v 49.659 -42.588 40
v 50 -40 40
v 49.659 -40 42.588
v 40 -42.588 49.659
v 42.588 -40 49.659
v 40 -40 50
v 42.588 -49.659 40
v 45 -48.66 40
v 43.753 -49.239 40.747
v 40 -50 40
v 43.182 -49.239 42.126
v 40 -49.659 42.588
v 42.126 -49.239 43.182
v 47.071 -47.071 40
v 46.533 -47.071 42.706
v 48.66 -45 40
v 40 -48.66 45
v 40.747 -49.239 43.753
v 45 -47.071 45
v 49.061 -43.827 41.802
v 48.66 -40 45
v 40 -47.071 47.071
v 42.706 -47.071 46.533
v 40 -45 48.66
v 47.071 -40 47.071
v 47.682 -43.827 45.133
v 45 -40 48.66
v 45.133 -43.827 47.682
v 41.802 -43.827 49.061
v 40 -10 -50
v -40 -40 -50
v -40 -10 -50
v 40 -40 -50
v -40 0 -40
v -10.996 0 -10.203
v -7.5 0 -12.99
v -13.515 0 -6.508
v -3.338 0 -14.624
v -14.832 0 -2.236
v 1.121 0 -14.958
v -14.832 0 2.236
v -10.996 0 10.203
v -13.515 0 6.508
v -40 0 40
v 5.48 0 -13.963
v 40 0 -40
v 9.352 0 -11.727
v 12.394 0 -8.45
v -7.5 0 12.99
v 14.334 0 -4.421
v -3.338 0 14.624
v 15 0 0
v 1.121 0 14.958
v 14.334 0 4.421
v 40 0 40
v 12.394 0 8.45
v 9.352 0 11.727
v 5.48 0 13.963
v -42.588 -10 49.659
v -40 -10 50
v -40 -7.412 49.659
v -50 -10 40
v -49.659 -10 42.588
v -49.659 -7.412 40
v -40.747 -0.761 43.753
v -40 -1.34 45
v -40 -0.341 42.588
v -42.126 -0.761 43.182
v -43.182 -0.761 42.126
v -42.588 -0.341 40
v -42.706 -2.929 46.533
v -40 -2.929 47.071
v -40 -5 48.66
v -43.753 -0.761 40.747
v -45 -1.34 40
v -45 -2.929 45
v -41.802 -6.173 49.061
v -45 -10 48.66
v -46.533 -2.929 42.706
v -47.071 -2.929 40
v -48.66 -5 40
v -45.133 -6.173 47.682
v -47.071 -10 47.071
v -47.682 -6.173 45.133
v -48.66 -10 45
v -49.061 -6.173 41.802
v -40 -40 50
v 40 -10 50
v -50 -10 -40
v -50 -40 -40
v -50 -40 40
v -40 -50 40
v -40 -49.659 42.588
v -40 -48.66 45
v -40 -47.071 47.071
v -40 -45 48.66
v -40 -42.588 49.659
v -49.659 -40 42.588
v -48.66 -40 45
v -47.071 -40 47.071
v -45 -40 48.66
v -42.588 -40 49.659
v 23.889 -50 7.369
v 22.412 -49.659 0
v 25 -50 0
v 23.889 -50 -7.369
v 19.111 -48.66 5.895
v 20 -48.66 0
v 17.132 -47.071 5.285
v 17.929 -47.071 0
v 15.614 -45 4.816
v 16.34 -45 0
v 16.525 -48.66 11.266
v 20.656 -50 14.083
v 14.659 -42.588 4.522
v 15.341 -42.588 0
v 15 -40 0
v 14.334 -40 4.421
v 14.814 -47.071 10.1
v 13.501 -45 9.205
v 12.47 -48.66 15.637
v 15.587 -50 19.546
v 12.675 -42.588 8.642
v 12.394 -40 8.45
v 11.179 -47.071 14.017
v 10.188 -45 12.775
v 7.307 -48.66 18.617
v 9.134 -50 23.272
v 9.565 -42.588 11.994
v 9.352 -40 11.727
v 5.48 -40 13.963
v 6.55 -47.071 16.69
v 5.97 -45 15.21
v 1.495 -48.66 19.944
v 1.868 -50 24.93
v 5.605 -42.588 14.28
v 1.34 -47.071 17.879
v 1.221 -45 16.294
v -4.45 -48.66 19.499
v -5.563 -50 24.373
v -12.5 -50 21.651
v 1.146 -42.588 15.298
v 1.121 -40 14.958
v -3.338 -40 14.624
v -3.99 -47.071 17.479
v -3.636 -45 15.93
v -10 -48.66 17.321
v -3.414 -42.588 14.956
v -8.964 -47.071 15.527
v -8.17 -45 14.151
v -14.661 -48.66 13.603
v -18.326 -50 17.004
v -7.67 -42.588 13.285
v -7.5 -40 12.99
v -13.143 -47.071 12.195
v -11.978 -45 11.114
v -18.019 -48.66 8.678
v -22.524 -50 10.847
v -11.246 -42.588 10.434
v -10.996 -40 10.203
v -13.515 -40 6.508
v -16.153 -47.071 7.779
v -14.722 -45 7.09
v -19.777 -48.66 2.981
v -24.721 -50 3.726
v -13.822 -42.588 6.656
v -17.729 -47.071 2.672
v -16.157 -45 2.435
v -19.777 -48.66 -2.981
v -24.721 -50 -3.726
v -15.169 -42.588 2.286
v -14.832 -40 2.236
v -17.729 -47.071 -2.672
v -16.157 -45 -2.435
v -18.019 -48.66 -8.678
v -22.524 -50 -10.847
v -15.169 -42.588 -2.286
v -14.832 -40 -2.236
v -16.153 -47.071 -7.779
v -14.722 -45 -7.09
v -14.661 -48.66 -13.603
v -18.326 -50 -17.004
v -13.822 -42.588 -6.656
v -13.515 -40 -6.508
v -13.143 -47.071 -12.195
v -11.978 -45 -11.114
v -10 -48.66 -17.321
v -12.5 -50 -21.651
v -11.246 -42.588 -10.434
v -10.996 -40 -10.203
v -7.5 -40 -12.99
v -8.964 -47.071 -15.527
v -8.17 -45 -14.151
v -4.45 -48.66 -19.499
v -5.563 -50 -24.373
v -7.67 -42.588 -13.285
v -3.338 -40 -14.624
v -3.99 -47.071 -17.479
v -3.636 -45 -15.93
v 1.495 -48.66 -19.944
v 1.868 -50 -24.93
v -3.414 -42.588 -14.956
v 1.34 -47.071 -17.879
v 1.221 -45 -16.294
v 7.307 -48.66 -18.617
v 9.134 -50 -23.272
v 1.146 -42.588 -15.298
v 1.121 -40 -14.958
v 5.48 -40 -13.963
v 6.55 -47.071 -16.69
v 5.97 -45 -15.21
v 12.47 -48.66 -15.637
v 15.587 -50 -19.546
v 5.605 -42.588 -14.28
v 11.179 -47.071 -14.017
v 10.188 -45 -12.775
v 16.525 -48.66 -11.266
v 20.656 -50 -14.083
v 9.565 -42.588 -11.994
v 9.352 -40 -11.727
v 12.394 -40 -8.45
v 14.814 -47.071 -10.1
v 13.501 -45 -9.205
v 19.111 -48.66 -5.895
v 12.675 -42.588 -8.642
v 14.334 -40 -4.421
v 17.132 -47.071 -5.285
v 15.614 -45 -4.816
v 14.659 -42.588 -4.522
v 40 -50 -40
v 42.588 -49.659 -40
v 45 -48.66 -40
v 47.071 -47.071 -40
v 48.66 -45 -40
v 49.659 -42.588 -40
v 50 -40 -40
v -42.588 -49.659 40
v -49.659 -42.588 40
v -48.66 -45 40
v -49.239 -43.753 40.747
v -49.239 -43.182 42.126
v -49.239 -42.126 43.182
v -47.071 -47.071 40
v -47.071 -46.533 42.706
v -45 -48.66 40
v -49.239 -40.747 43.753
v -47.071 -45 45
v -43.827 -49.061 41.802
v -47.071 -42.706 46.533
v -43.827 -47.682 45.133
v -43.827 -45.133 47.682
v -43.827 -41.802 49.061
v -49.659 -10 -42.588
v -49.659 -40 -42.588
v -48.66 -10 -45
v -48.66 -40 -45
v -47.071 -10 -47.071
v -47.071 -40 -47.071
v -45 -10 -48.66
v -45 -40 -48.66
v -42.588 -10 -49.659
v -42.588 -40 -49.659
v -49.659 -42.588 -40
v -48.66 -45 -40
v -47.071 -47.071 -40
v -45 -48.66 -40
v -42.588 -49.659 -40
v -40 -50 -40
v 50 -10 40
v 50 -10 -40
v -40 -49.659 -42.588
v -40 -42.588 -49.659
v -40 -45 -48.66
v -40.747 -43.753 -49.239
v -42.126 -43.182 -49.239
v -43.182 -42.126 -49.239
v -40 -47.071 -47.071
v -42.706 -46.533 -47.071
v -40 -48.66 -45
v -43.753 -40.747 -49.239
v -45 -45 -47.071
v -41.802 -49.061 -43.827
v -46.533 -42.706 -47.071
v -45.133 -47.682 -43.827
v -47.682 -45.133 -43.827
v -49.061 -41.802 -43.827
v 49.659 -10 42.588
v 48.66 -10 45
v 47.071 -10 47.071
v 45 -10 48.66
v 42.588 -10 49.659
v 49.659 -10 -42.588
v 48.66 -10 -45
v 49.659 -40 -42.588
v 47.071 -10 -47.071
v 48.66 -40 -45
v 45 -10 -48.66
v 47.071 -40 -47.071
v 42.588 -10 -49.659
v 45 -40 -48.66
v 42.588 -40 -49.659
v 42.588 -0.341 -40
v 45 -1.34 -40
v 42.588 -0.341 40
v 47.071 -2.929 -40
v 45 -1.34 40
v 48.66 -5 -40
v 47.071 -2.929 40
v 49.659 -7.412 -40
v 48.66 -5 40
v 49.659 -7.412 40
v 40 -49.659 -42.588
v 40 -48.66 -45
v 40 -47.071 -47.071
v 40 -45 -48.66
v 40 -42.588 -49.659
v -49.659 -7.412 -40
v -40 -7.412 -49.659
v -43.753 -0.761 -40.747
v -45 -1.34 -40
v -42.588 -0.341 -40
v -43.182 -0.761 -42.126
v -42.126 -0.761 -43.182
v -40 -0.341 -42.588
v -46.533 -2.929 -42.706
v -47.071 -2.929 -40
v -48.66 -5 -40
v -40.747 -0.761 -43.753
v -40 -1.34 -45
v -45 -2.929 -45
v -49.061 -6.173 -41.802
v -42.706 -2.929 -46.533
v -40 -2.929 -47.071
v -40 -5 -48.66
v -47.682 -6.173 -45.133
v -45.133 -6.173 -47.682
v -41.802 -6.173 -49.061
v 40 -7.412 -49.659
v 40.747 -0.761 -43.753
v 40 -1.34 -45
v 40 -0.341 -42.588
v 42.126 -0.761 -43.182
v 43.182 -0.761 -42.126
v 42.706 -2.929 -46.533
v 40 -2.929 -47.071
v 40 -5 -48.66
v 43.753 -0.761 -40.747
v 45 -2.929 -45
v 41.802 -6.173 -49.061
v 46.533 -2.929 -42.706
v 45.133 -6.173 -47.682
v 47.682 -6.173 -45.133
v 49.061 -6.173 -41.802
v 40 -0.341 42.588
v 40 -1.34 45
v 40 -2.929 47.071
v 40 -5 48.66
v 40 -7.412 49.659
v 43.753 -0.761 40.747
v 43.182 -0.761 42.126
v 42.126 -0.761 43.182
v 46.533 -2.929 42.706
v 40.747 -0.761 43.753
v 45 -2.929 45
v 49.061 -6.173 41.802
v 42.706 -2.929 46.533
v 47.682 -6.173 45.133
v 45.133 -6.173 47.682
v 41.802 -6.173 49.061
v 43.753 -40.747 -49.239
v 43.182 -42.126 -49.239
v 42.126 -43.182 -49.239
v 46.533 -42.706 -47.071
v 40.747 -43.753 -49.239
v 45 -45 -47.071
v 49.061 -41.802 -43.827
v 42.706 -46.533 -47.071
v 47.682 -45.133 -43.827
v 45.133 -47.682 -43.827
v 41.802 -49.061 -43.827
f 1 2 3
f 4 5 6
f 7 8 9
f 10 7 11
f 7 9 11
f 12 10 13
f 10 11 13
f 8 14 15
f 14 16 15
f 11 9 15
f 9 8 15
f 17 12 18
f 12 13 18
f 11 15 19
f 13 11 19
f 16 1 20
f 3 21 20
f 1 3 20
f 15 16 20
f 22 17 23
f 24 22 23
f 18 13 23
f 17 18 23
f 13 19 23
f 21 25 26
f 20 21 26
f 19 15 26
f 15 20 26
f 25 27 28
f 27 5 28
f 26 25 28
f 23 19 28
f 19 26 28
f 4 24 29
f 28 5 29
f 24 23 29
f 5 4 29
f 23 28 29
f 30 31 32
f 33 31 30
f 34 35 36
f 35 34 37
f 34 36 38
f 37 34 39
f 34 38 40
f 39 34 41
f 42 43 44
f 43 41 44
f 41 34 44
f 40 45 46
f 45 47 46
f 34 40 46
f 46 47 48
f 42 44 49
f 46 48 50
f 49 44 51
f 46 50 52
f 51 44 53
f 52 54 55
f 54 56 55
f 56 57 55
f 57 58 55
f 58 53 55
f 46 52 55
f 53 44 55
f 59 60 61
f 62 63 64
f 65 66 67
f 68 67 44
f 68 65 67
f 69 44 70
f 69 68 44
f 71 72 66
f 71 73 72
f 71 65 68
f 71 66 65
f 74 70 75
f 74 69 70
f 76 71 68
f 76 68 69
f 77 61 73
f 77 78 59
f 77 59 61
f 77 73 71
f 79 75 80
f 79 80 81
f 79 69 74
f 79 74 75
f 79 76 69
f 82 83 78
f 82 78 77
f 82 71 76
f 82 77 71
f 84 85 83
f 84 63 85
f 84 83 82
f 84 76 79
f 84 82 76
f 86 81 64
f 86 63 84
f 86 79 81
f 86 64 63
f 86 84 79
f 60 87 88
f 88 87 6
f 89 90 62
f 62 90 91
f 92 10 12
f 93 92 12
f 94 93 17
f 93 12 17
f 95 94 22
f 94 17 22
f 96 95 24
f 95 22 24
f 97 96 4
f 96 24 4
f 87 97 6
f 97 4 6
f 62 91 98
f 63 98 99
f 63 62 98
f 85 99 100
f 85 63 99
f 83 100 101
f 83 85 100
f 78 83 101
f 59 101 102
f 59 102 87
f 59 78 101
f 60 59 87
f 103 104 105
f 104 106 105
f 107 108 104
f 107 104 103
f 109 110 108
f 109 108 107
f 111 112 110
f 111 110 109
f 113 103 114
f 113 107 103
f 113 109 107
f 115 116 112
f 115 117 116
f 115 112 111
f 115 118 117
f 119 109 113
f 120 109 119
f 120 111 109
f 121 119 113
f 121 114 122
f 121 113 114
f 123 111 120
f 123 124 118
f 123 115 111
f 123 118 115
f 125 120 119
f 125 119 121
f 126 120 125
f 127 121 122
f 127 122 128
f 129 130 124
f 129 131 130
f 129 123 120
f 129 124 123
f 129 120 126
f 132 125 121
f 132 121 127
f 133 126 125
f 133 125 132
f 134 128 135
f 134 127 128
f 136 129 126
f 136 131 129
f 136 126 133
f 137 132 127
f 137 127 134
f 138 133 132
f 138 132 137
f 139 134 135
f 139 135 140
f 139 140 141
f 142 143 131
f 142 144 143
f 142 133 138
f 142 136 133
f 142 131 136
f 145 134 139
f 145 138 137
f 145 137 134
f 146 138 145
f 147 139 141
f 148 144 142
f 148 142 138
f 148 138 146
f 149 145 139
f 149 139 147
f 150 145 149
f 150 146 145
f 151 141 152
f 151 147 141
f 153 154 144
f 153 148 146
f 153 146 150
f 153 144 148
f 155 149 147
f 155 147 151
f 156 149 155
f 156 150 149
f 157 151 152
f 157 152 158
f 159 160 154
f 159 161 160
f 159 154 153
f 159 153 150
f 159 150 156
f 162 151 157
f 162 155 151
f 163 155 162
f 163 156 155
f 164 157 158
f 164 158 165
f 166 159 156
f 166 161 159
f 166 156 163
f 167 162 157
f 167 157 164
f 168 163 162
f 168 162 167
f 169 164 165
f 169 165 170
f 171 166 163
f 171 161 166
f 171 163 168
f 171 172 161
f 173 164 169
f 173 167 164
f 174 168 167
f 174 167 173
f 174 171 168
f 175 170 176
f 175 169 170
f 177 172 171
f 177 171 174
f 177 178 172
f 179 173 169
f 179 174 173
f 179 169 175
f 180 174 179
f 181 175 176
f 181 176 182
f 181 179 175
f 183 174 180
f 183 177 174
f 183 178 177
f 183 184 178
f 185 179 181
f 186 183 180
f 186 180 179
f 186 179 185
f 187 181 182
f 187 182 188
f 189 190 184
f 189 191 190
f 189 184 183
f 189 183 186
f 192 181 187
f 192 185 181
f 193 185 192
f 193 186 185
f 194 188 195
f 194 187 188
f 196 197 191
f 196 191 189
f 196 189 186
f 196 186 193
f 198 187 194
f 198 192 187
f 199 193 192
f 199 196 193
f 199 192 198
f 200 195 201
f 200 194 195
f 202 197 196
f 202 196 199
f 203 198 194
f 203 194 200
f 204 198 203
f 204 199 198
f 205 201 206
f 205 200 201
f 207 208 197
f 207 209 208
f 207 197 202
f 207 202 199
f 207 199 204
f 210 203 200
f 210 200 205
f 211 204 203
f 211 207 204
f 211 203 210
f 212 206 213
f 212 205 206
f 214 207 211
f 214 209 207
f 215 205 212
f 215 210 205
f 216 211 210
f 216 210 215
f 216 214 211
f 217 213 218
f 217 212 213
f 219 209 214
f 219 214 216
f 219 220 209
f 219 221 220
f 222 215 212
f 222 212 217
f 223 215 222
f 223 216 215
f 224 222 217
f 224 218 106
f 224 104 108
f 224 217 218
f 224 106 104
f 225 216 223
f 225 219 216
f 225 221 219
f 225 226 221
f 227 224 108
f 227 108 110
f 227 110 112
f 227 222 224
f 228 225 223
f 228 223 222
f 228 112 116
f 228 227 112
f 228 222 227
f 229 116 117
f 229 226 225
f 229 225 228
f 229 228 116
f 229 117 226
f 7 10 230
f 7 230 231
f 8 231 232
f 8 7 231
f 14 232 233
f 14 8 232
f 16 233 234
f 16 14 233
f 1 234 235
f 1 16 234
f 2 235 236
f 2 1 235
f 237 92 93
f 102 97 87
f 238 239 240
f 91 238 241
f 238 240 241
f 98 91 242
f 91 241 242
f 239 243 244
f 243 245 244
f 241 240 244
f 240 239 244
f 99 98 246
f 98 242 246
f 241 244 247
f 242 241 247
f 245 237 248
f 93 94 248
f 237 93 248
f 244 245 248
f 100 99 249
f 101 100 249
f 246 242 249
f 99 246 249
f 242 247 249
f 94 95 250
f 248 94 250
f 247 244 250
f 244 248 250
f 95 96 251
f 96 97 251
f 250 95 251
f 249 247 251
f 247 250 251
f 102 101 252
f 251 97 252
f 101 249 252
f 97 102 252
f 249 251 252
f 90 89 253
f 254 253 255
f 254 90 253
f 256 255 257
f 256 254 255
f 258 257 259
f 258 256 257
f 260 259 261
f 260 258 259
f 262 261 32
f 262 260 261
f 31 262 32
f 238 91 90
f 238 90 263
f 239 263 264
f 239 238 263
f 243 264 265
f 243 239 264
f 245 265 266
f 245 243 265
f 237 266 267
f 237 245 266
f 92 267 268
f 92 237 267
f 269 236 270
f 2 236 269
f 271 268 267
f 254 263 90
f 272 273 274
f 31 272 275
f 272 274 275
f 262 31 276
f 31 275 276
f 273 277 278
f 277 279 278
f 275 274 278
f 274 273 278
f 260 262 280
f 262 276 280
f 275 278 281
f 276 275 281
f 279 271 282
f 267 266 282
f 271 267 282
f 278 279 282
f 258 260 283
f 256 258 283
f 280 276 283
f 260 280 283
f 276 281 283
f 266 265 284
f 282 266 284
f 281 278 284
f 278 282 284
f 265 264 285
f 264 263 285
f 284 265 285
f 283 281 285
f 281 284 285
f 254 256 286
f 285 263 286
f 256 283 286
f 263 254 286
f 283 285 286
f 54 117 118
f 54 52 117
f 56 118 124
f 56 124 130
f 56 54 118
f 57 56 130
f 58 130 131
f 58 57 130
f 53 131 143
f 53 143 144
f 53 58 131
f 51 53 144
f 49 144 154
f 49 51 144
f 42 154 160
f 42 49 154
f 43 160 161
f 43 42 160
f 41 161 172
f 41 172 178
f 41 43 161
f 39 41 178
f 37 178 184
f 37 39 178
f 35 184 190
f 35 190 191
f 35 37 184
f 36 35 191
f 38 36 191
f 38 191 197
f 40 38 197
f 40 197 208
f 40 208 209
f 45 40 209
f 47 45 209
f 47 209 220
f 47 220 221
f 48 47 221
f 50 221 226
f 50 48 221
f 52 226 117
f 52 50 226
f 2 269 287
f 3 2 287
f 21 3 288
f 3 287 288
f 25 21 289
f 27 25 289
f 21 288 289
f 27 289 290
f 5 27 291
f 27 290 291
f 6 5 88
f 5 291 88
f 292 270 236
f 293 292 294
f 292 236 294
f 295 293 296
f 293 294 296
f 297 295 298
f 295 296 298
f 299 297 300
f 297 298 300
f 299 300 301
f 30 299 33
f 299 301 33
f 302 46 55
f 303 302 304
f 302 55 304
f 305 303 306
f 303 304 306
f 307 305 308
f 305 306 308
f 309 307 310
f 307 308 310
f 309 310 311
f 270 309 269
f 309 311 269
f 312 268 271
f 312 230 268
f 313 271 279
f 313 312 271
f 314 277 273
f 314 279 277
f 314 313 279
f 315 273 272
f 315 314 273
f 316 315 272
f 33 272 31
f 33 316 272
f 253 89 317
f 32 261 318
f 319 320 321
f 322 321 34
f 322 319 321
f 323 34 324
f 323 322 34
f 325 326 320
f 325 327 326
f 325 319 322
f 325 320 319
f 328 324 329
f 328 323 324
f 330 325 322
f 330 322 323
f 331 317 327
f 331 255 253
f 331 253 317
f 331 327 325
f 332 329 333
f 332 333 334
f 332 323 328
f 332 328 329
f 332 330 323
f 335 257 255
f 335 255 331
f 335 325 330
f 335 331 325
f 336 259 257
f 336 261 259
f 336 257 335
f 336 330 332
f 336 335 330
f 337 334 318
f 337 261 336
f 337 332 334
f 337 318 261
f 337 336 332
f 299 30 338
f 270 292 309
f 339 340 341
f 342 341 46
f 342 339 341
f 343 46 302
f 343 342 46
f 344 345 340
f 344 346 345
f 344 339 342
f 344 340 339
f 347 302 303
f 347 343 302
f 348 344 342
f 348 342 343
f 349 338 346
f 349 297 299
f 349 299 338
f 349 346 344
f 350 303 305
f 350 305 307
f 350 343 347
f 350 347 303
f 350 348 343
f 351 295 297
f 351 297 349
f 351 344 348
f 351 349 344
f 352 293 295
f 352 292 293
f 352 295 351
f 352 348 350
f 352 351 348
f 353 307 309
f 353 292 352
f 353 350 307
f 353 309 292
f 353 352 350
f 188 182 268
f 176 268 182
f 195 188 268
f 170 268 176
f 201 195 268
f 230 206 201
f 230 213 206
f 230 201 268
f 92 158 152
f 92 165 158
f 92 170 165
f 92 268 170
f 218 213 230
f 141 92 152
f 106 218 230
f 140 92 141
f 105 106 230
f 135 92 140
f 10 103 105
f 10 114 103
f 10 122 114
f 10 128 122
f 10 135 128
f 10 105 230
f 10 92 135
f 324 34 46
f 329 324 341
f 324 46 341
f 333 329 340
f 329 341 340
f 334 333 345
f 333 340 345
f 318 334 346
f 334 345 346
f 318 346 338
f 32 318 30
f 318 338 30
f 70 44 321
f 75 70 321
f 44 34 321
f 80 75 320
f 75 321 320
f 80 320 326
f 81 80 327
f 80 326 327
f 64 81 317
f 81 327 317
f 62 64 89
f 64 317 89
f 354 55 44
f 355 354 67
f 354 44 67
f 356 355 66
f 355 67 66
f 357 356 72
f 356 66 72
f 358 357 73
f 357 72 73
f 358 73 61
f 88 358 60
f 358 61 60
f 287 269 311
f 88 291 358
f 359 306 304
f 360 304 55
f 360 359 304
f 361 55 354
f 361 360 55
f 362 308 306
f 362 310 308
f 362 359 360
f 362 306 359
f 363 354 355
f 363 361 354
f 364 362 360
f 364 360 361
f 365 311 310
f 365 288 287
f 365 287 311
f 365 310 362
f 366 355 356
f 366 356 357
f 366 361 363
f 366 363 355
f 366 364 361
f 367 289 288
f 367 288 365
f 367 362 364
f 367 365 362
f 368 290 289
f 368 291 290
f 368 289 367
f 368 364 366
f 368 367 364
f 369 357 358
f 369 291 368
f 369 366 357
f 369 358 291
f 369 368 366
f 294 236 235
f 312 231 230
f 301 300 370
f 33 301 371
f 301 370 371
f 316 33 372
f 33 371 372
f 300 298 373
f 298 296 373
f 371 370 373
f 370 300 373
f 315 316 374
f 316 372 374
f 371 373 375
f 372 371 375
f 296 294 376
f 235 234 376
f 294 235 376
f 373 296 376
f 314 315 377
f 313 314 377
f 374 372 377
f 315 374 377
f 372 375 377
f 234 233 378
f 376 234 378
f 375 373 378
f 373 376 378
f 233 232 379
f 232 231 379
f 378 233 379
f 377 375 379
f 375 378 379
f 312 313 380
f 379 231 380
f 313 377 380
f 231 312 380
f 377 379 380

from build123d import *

# Parameters (mm, degrees)
F0_W     = 100
F0_H     = 100
F0_R     = 15
F1_DEPTH = 50
F2_R     = 10
F3_DEPTH = 50
F6_R     = 10


# Not quite as in the source:
# - the program builds the solid bodies; features that only make, move or delete a surface that nothing else refers to are left out


with BuildPart() as f1:
    # F0 (on Front) → F1 (new body, symmetric)
    with BuildSketch(Plane.XZ):
        Rectangle(F0_W, F0_H)
        Circle(F0_R, mode=Mode.SUBTRACT)
    extrude(amount=F1_DEPTH, both=True)

    # F2
    f2_edges = [f1.edges().sort_by_distance(p)[0] for p in [
        (50, 50, 0),
        (50, 0, 50),
        (50, -50, 0),
        (50, 0, -50),
        (0, -50, 50),
        (-50, -50, 0),
        (0, -50, -50),
        (-15, -50, 0),
        (0, 50, 50),
        (-50, 0, 50),
        (-50, 50, 0),
        (-50, 0, -50),
    ]]
    fillet(f2_edges, radius=F2_R)

    # F0 (on Front) → F3 (cut)
    with BuildSketch(Plane.XZ):
        Rectangle(F0_W, F0_H)
        Circle(F0_R, mode=Mode.SUBTRACT)
    extrude(amount=-F3_DEPTH, mode=Mode.SUBTRACT)

    # F6
    f6_edges = [f1.edges().sort_by_distance(p)[0] for p in [
        (-47.071068, 0, -47.071068),
        (-40, -20, -50),
        (-47.071068, -40, -47.071068),
        (-50, -20, -40),
        (-47.071068, 0, 47.071068),
        (-40, -20, 50),
        (-47.071068, -40, 47.071068),
        (-50, -20, 40),
        (-47.071068, -47.071068, 40),
        (-50, -40, 0),
        (-40, -50, 0),
        (-47.071068, -47.071068, -40),
        (-50, 0, 0),
        (47.071068, -40, -47.071068),
        (50, -20, -40),
        (47.071068, 0, -47.071068),
        (40, -20, -50),
        (50, -40, 0),
        (50, -20, 40),
        (50, 0, 0),
        (40, -50, 0),
        (0, -50, -40),
        (0, -50, 40),
        (-25, -50, 0),
        (0, 0, 50),
        (47.071068, 0, 47.071068),
        (0, 0, -50),
    ]]
    fillet(f6_edges, radius=F6_R)


solid = f1.part
